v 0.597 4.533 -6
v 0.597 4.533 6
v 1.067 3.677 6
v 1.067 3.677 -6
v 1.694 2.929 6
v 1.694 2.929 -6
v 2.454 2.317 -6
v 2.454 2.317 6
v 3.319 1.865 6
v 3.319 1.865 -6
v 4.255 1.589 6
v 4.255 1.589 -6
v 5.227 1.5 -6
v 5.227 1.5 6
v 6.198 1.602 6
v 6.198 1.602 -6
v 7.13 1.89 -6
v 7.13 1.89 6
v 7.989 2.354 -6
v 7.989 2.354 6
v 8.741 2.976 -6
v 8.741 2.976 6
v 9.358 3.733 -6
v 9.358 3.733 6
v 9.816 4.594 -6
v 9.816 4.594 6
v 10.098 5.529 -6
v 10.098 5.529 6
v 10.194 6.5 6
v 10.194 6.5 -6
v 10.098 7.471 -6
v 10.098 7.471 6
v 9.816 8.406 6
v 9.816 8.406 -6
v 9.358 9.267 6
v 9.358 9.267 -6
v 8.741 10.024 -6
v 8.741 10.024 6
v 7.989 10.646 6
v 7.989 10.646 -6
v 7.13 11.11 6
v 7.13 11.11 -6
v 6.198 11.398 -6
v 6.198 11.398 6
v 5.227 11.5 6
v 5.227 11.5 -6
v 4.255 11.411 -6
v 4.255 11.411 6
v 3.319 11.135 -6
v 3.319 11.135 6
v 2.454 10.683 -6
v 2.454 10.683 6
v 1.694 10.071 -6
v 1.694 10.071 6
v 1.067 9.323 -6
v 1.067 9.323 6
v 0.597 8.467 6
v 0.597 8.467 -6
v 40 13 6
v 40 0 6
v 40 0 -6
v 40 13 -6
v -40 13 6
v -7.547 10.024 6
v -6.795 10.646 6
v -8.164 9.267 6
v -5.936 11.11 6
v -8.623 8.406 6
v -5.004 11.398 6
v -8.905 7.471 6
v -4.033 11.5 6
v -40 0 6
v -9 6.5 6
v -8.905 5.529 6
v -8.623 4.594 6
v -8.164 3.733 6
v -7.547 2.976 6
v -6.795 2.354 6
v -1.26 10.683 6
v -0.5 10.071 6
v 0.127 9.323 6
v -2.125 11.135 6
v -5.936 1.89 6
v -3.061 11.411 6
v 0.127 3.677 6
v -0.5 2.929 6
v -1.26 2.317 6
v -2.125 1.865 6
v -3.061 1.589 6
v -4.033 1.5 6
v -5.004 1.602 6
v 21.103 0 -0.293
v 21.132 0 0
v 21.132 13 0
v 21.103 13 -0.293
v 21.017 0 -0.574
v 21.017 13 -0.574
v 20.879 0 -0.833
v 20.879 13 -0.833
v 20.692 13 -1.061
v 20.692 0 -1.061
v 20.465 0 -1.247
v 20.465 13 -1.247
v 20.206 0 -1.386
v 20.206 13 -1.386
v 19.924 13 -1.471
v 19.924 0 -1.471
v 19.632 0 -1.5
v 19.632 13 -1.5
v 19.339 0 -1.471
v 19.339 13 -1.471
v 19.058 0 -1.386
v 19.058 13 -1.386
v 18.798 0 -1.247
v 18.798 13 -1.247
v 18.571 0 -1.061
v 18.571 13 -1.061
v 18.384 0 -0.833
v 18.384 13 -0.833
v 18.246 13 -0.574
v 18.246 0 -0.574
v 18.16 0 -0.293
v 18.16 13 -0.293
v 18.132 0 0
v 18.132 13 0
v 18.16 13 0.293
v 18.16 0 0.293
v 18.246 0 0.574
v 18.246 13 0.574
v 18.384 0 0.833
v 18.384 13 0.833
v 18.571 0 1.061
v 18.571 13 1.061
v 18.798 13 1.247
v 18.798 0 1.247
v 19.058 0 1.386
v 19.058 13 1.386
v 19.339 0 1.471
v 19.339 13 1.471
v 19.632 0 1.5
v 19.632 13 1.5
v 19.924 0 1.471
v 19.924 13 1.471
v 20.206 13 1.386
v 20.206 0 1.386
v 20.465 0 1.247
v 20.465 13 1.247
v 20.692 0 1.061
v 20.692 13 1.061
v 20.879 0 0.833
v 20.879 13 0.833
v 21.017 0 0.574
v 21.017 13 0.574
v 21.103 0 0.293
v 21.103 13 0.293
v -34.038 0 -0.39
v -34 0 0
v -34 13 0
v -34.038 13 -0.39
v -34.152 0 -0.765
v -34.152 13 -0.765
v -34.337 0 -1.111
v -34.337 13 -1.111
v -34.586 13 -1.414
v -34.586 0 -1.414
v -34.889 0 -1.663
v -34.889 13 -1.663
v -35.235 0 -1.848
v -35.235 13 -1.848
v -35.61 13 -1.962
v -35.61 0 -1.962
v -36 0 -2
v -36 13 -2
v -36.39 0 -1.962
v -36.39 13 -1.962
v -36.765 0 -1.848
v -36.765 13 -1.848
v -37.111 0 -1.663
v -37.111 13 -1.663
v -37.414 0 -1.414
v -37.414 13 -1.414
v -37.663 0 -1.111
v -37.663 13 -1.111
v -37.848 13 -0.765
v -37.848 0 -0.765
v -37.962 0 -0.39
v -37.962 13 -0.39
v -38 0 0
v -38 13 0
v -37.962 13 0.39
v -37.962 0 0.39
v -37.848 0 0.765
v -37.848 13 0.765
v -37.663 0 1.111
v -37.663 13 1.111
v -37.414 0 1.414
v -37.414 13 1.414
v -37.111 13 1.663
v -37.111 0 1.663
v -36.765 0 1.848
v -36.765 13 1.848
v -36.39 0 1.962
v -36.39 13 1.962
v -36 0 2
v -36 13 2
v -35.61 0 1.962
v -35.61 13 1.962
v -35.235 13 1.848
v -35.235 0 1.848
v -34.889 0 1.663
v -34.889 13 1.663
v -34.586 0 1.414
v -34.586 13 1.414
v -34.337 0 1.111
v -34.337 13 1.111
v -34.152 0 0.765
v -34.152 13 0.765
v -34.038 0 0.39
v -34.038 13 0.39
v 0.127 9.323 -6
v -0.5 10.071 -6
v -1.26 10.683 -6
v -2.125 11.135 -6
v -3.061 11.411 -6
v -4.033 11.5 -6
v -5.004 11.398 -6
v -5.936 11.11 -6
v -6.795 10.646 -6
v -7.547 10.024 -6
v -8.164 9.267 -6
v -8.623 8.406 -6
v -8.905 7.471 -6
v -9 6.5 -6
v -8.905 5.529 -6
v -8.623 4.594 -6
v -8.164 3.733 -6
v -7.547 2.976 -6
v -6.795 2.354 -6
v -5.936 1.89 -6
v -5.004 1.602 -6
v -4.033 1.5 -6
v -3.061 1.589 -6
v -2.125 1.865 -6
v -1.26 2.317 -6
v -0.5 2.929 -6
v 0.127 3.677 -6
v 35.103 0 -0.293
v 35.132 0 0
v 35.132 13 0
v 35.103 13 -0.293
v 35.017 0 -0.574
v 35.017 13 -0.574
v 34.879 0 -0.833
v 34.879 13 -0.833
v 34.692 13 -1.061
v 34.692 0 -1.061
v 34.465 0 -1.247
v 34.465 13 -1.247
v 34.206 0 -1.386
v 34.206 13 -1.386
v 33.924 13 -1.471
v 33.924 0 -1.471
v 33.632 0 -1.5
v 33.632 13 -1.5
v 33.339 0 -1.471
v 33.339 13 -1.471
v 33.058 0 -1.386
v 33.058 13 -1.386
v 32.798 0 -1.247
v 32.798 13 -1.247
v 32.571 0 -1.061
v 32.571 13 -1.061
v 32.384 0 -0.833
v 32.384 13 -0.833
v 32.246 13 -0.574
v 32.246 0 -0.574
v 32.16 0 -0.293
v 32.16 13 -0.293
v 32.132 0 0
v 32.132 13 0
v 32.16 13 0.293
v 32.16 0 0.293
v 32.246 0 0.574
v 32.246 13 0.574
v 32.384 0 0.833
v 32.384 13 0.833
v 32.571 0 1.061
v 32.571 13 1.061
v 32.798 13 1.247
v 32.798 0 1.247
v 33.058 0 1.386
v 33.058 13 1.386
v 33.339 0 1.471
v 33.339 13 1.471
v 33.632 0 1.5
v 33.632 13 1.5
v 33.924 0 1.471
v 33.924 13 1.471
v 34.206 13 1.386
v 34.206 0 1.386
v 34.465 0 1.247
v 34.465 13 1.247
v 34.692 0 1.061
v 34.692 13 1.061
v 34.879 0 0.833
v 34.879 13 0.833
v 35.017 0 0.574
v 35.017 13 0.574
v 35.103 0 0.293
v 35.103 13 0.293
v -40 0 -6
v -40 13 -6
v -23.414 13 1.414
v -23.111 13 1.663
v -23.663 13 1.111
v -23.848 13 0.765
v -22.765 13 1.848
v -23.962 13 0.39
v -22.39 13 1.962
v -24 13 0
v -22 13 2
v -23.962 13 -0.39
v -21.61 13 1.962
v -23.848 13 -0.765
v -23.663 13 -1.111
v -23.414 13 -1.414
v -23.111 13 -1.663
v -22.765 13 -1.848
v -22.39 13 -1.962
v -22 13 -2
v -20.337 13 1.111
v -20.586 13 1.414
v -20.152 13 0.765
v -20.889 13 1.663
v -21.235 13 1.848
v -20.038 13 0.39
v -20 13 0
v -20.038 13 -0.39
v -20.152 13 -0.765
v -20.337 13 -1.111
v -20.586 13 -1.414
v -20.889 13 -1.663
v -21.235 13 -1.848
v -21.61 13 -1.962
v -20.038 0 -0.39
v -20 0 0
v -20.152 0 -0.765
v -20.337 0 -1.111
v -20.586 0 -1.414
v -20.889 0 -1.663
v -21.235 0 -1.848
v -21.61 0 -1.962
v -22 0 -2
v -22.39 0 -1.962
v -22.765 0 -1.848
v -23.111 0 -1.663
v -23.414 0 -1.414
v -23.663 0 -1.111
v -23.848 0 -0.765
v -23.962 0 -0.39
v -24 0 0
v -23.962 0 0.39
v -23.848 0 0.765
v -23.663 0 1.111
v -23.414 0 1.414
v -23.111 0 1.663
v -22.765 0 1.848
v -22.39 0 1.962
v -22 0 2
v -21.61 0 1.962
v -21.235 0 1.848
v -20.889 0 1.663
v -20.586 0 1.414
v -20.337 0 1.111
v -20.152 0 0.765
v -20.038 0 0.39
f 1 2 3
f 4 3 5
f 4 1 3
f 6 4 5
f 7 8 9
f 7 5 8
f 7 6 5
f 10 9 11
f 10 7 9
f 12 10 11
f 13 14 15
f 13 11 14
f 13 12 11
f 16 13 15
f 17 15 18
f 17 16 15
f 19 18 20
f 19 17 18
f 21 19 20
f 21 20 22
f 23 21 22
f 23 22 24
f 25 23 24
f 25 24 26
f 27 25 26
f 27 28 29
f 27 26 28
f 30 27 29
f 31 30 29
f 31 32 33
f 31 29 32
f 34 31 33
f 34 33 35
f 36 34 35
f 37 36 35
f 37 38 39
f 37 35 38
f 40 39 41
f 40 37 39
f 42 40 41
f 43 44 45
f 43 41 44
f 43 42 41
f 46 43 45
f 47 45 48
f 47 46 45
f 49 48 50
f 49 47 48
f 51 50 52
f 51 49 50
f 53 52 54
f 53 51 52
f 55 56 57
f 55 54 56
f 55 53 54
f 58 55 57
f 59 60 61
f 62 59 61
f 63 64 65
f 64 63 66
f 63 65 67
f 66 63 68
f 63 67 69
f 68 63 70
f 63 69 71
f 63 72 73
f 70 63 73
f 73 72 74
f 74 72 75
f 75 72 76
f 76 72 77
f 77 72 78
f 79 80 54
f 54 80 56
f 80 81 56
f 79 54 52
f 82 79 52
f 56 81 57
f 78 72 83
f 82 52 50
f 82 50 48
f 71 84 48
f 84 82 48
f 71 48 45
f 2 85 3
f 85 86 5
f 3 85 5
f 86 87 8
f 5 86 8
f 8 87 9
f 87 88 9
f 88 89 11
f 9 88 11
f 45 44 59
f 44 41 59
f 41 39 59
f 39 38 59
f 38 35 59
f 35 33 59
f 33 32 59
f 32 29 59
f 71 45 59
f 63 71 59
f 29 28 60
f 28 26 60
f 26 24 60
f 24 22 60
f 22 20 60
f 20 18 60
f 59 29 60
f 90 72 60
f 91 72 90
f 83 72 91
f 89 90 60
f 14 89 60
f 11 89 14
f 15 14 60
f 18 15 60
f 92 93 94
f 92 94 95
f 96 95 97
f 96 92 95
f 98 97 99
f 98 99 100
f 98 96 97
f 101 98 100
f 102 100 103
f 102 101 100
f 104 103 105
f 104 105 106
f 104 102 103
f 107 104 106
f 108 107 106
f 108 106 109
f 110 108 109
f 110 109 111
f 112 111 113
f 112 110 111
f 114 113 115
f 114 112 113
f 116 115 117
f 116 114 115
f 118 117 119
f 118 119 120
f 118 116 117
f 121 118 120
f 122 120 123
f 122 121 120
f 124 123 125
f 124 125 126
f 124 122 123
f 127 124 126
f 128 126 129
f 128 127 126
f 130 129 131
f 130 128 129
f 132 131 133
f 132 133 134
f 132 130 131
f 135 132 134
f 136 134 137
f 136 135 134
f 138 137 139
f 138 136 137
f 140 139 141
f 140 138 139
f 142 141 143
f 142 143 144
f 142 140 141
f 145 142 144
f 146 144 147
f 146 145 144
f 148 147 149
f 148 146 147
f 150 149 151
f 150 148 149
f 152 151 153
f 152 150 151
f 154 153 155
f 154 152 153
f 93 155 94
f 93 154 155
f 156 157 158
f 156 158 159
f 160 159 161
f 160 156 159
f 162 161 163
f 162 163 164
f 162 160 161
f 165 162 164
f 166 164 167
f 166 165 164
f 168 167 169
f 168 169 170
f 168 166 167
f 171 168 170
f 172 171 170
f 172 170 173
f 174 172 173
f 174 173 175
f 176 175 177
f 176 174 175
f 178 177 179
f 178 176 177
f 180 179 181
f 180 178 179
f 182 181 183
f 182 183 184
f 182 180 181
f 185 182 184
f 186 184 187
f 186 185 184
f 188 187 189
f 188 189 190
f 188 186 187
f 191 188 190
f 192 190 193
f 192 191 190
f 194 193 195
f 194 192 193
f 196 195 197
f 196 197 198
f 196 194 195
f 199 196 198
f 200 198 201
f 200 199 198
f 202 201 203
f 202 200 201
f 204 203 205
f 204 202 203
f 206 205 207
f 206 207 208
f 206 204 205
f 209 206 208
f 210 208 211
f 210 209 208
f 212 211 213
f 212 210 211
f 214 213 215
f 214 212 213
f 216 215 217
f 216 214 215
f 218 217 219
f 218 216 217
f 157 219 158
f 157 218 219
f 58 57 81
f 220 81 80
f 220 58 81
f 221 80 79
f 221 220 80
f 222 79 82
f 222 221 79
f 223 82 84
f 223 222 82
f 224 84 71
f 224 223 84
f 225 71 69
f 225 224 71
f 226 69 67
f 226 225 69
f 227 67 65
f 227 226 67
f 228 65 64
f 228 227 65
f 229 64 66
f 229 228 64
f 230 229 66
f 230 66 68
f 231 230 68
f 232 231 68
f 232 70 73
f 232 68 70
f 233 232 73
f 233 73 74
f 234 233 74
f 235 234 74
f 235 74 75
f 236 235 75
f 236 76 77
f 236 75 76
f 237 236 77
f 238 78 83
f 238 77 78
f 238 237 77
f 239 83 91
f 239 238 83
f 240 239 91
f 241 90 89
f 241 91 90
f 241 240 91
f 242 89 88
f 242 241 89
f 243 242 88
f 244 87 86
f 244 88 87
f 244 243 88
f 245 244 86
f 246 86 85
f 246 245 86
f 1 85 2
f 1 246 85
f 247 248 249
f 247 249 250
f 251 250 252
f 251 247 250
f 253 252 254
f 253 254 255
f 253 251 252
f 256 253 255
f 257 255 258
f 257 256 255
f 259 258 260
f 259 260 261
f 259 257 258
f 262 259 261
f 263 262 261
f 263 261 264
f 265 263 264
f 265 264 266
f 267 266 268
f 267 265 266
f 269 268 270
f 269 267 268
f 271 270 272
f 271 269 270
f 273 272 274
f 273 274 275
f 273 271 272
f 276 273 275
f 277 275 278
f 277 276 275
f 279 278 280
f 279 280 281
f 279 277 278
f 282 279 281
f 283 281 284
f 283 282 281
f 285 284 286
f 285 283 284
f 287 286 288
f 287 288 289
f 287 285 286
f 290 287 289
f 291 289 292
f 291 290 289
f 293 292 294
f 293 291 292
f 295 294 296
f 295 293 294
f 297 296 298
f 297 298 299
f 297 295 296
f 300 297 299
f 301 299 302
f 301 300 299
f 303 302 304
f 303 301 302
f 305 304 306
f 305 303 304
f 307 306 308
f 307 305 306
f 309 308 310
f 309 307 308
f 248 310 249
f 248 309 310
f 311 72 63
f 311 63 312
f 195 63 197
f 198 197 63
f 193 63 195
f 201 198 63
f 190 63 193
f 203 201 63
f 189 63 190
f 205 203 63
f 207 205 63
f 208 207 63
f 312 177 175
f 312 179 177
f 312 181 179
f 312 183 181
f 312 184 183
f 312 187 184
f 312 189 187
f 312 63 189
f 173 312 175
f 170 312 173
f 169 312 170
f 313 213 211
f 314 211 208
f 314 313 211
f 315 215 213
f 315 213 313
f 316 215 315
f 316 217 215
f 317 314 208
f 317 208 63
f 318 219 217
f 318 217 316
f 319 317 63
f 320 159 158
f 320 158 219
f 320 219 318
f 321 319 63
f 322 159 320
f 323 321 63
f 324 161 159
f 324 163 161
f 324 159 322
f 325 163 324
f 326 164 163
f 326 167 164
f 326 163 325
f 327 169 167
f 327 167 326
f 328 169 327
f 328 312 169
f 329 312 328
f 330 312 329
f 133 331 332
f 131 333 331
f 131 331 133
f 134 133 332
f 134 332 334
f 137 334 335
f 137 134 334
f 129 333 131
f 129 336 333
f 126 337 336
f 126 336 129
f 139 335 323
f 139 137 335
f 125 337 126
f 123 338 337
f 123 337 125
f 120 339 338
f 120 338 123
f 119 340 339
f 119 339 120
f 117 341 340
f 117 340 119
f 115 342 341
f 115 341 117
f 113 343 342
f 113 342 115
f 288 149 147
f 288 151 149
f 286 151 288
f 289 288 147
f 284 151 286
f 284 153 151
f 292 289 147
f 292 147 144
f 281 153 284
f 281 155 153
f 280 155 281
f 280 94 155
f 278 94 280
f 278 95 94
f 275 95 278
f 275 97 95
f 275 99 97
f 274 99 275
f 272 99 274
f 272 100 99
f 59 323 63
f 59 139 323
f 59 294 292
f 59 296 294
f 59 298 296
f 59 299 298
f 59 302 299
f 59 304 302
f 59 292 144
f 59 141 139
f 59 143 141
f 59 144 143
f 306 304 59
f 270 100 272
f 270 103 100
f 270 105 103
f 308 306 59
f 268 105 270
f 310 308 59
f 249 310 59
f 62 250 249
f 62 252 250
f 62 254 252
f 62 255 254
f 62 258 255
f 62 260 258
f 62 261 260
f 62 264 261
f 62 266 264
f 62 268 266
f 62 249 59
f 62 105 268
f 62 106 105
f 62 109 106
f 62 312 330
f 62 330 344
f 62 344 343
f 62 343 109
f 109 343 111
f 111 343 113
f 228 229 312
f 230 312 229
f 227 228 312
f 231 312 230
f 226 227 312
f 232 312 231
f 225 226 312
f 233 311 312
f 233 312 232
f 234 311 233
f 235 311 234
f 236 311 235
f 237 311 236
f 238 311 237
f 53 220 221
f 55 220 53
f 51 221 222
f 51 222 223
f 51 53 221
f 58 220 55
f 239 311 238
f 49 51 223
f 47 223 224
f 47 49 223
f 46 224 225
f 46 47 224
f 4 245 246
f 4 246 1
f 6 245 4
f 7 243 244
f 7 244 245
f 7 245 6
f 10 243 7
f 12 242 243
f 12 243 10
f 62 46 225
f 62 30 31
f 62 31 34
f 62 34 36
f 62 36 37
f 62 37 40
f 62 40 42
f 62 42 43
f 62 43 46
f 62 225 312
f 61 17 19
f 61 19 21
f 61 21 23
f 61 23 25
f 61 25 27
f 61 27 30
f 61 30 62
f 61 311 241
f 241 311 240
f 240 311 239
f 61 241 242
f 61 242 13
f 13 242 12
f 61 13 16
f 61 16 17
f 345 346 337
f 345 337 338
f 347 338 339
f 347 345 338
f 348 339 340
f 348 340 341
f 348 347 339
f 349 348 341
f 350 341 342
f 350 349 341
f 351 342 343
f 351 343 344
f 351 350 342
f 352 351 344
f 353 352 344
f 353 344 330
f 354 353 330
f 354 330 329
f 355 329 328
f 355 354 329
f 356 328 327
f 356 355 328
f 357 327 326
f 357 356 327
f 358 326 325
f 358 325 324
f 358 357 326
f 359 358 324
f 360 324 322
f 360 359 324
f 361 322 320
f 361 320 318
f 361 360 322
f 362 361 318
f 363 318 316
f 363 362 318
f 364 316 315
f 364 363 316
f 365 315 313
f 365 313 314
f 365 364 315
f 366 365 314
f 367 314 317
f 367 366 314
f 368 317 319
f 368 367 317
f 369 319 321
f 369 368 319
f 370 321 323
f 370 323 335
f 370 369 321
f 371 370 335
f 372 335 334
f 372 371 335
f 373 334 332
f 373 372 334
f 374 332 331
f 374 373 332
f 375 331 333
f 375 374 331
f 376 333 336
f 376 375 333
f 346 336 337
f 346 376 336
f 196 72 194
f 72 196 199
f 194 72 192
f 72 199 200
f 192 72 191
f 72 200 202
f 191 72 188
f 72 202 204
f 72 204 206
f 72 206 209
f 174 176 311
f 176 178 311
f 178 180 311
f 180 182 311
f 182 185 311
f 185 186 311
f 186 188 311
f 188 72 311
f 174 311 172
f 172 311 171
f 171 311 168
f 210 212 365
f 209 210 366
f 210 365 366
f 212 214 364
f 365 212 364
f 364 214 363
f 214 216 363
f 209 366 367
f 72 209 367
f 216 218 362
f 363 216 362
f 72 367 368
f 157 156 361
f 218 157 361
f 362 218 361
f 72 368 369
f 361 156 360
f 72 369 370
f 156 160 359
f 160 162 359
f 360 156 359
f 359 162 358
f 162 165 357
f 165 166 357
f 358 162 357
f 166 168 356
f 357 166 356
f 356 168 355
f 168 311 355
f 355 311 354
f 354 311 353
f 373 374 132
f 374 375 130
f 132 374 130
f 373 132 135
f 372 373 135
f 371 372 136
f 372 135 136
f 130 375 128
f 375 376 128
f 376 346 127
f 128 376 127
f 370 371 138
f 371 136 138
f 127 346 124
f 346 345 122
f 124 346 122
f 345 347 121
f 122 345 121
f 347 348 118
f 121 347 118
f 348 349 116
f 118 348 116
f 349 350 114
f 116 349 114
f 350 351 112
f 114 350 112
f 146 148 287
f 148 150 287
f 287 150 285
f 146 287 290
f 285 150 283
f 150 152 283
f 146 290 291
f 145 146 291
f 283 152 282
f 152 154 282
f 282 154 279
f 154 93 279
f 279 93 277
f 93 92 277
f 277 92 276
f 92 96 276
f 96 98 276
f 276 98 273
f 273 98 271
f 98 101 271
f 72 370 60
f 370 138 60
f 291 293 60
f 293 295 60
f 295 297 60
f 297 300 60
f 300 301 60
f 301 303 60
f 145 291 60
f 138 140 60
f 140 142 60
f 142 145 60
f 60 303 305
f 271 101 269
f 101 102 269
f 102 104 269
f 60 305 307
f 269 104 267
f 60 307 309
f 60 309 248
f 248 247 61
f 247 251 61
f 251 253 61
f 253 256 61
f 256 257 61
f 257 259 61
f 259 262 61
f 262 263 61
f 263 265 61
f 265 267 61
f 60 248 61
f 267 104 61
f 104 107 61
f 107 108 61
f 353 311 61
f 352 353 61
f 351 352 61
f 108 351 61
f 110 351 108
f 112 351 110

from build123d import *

# Parameters (mm, degrees)
SKETCH2_W               = 80
SKETCH2_H               = 12
BOSS_EXTRUDE1_DEPTH     = 13
SKETCH3_R               = 2
SKETCH3_R_2             = 1.5
CUT_EXTRUDE1_DEPTH      = 13
SKETCH4_R               = 5
CUT_EXTRUDE2_DEPTH      = 6.5
CUT_EXTRUDE2_DEPTH_BACK = 6.5


with BuildPart() as part:
    # Sketch2 → Boss-Extrude1 (new body)
    with BuildSketch(Plane(origin=(0, 0, 0), x_dir=(1, 0, 0), z_dir=(0, 1, 0))):
        Rectangle(SKETCH2_W, SKETCH2_H)
    extrude(amount=BOSS_EXTRUDE1_DEPTH)

    # Sketch3 → Cut-Extrude1 (cut)
    with BuildSketch(Plane(origin=(0, 0, 0), x_dir=(1, 0, 0), z_dir=(0, 1, 0))):
        with Locations((-36, 0)):
            Circle(SKETCH3_R)
        with Locations((-22, 0)):
            Circle(SKETCH3_R)
        with Locations((33.631617814, 0)):
            Circle(SKETCH3_R_2)
        with Locations((19.631617814, 0)):
            Circle(SKETCH3_R_2)
    extrude(amount=CUT_EXTRUDE1_DEPTH, mode=Mode.SUBTRACT)

    # Sketch4 → Cut-Extrude2 (cut, two sides)
    with BuildSketch(Plane.XY) as cut_extrude2_sk:
        with Locations((-4, 6.5)):
            Circle(SKETCH4_R)
        with Locations((5.193549115, 6.5)):
            Circle(SKETCH4_R)
    extrude(amount=CUT_EXTRUDE2_DEPTH, mode=Mode.SUBTRACT)
    extrude(cut_extrude2_sk.sketch, amount=-CUT_EXTRUDE2_DEPTH_BACK, mode=Mode.SUBTRACT)


solid = part.part
